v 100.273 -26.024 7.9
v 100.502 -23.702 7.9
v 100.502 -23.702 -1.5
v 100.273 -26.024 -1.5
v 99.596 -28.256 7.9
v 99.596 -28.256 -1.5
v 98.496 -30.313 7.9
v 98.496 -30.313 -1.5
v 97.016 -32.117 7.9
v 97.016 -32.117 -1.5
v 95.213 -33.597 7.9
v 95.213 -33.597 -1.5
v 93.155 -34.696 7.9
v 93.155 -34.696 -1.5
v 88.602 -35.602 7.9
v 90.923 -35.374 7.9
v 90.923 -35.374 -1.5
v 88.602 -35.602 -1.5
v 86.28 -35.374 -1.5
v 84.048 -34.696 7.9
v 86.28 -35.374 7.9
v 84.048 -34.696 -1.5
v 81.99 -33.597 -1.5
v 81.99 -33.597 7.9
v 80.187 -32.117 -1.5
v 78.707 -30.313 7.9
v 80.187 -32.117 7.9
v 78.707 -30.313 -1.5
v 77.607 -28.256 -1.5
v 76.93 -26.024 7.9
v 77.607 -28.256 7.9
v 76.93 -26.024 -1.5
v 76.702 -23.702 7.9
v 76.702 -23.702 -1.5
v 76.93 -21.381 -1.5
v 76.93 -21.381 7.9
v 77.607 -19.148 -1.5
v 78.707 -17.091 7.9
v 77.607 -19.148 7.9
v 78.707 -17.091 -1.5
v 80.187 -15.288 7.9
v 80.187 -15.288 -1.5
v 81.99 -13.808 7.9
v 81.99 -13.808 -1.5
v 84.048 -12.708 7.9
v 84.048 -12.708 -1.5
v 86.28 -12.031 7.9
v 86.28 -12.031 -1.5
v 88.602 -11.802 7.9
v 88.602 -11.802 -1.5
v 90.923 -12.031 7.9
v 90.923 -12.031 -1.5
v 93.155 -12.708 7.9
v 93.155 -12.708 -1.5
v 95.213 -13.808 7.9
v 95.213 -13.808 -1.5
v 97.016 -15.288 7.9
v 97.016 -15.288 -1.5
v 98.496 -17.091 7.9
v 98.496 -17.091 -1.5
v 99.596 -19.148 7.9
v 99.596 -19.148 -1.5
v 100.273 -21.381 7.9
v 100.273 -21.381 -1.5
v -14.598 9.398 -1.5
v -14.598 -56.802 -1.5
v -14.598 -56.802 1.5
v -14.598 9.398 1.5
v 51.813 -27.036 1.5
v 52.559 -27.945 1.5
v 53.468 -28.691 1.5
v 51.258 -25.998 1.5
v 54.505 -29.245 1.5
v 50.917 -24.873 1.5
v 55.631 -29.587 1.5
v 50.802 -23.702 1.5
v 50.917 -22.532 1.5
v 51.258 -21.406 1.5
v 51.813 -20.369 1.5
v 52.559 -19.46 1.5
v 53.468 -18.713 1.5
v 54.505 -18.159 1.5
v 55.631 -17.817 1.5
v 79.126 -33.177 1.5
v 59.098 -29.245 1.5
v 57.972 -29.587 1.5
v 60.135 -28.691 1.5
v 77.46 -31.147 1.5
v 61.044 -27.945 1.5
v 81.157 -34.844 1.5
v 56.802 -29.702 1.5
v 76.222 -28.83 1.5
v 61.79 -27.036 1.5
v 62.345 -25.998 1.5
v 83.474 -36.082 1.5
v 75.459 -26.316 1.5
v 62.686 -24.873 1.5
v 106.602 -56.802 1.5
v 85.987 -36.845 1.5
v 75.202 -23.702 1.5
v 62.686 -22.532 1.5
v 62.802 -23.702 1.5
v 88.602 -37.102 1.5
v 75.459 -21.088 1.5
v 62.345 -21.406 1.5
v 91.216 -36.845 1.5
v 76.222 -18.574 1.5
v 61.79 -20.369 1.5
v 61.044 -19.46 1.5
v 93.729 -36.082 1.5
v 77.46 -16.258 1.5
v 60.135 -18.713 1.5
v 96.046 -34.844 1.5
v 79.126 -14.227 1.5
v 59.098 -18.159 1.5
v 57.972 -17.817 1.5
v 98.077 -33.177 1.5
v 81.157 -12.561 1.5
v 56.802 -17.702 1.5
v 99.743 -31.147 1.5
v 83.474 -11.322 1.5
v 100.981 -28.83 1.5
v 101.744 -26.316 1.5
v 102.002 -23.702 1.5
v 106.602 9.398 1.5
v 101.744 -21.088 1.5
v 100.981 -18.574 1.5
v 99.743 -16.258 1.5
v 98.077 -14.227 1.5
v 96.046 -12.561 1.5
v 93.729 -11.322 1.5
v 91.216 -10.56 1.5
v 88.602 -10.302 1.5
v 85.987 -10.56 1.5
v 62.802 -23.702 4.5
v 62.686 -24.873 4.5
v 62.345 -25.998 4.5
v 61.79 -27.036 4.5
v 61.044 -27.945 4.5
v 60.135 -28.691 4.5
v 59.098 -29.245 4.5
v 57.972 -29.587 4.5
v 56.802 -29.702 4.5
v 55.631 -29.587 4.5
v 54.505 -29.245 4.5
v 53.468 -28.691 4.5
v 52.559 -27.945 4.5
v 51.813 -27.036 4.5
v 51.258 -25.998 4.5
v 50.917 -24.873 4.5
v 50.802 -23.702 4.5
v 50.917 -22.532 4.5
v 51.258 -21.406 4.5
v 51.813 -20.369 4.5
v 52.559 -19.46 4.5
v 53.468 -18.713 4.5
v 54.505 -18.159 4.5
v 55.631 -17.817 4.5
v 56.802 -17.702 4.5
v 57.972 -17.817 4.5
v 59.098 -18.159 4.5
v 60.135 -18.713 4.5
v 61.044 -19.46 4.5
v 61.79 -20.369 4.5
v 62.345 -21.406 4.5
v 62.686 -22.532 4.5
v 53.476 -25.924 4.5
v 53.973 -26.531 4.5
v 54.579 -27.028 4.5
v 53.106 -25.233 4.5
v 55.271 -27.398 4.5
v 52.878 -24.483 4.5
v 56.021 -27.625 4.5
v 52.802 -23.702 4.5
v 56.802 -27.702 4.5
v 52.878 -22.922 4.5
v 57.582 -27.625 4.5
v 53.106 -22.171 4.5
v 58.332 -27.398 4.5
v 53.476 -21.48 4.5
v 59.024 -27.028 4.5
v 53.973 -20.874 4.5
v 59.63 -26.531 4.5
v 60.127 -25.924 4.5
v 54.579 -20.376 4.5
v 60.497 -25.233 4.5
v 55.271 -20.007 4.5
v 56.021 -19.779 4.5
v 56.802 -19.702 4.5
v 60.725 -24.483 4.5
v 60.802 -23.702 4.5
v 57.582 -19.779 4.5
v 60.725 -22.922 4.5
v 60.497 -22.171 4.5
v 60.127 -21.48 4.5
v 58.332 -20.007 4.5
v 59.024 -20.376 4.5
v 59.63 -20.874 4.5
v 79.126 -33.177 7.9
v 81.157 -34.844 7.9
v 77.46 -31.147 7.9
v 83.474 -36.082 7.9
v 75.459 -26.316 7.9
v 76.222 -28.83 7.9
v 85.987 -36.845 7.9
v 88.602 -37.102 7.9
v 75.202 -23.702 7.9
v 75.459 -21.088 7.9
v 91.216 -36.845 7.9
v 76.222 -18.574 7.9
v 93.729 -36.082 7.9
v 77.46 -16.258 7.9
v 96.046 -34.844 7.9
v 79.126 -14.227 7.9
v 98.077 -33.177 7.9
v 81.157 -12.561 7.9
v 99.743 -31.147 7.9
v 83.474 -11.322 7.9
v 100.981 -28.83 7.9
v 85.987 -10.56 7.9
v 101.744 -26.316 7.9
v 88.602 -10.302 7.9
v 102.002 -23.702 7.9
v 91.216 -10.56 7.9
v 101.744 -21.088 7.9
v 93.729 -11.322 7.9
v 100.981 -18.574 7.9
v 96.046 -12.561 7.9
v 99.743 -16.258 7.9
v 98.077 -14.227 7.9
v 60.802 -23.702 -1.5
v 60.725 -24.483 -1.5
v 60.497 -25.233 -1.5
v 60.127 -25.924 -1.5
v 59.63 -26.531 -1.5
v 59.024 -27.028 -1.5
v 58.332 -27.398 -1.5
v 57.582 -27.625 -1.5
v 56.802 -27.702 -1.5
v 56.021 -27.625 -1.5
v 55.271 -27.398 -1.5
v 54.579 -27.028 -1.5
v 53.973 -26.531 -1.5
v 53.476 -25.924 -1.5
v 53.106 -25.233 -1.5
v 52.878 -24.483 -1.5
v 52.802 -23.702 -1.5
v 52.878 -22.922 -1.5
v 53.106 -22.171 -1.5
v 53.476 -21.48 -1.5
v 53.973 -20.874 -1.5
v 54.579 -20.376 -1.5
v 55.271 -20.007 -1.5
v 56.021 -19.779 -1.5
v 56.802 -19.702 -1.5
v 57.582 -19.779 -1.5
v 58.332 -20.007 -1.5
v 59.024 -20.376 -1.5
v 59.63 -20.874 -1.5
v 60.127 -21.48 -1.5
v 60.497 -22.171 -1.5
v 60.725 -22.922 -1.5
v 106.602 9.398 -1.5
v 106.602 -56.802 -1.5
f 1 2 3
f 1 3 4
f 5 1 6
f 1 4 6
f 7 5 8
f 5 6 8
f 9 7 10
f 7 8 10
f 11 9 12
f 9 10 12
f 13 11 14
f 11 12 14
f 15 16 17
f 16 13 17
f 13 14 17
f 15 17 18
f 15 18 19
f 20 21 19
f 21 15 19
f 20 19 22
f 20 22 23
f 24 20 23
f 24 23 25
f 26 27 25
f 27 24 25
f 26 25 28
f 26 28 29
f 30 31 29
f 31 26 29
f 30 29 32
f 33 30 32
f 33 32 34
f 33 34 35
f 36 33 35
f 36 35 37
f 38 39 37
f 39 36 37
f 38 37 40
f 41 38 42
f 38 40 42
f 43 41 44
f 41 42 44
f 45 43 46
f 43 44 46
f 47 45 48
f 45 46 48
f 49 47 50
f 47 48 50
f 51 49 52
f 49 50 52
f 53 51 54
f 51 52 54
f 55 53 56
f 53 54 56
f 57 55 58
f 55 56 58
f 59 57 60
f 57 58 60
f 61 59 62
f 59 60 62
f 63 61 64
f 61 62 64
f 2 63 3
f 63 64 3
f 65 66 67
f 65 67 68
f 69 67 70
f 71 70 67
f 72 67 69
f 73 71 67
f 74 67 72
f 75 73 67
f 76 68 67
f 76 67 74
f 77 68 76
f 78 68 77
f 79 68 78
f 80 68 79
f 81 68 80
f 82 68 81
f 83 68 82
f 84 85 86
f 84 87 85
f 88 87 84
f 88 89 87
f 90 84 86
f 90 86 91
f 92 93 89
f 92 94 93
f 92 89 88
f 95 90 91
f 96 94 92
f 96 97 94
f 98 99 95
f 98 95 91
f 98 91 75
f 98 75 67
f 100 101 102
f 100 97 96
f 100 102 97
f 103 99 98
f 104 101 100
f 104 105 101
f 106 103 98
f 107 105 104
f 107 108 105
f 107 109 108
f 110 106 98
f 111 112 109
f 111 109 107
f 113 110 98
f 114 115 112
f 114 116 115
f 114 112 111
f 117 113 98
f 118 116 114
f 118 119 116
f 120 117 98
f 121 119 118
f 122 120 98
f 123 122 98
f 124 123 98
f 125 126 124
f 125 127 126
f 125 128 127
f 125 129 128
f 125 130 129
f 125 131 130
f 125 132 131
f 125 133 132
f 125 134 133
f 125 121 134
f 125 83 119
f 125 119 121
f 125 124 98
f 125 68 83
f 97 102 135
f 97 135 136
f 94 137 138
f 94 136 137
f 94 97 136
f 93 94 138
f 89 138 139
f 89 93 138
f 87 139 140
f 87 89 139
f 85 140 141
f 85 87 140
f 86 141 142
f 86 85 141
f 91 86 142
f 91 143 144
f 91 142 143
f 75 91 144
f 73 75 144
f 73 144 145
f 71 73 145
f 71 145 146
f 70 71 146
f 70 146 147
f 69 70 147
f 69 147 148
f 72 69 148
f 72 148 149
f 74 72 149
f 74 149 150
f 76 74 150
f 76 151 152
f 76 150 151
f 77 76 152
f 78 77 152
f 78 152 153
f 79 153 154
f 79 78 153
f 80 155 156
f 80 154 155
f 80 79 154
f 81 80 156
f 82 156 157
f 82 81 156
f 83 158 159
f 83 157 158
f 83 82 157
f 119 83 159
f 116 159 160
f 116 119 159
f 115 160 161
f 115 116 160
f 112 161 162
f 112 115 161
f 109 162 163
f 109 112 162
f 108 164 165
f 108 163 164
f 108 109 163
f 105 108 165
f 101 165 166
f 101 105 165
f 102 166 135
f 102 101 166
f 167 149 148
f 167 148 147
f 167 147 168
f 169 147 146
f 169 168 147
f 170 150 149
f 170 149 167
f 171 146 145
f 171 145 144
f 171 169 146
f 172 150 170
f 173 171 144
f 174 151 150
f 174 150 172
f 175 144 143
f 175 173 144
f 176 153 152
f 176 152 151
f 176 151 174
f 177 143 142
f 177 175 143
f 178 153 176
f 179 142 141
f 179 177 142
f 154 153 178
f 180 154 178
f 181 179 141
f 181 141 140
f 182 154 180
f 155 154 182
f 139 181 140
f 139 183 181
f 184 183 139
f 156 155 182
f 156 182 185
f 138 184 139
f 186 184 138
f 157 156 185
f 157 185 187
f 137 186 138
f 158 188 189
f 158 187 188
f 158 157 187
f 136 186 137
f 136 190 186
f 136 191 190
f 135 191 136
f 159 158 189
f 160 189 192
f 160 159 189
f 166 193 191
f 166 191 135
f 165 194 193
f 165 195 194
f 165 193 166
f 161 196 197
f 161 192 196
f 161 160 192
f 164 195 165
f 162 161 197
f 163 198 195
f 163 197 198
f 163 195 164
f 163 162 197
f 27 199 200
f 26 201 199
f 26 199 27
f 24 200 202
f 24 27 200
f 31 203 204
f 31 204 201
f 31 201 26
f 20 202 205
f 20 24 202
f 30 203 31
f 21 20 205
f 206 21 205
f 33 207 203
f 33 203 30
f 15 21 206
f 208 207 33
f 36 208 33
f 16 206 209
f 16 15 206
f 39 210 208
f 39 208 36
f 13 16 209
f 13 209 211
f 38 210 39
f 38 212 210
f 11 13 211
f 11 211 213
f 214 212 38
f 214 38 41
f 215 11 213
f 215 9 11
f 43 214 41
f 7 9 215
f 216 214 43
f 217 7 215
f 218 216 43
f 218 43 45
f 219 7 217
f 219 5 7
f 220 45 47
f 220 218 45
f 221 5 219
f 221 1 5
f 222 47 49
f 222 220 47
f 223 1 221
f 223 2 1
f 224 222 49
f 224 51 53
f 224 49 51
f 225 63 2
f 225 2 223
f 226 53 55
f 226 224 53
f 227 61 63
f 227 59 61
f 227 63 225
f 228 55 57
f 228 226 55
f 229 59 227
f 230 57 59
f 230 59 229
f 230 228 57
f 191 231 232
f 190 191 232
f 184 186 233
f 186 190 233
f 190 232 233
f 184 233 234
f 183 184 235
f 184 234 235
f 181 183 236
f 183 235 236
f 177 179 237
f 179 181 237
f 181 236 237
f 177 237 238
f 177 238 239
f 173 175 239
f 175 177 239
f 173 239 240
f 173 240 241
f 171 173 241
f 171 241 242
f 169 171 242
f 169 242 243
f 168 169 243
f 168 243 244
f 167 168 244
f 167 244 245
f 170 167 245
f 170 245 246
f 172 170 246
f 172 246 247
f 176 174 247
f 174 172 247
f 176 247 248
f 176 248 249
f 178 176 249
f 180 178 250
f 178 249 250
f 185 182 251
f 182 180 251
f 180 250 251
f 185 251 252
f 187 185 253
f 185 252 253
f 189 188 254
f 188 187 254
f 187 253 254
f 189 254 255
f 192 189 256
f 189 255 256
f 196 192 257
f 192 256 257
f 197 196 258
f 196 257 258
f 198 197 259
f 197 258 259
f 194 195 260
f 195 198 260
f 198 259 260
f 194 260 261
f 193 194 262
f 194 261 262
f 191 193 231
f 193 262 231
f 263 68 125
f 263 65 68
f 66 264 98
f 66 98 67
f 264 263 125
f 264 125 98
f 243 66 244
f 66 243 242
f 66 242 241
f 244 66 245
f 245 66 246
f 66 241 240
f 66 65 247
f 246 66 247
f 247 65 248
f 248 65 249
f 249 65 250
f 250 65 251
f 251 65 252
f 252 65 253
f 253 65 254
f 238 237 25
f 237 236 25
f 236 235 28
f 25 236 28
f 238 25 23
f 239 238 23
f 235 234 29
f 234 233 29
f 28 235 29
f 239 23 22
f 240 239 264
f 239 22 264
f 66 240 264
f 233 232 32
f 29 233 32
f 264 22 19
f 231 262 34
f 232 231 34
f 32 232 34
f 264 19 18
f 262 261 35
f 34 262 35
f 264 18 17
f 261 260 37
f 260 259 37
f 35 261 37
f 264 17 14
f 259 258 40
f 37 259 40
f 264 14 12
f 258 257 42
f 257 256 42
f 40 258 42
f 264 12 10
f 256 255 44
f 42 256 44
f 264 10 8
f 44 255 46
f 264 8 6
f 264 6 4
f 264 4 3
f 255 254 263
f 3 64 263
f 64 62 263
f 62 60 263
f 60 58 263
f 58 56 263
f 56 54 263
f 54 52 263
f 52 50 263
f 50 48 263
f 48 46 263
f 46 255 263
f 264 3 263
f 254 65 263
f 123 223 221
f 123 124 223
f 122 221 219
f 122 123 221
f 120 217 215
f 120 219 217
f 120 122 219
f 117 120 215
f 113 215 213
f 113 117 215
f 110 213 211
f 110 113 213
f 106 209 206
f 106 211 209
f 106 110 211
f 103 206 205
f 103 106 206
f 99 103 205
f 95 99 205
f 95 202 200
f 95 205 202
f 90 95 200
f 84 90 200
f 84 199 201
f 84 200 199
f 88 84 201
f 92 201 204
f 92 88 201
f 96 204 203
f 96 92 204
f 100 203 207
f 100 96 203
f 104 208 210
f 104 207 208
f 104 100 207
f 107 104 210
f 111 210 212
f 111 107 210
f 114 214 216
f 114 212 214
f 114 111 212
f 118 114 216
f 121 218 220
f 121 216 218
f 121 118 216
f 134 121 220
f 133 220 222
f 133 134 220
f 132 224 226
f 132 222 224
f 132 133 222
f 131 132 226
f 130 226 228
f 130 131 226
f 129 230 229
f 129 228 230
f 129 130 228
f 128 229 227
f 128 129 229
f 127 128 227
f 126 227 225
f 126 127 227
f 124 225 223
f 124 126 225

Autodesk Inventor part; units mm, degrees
ref_plane "YZ Plane" through (0, 0, 0) normal (1, 0, 0) x (0, 1, 0)
ref_plane "XZ Plane" through (0, 0, 0) normal (0, 1, 0) x (-1, 0, 0)
ref_plane "XY Plane" through (0, 0, 0) normal (0, 0, 1) x (1, 0, 0)
sketch "Sketch1" plane through (0, 0, 0) normal (0, 0, 1) x (1, 0, 0)
  line L0 (-14.5985, 9.3978) -> (106.6015, 9.3978)
  line L1 (106.6015, 9.3978) -> (106.6015, -56.8022)
  line L2 (106.6015, -56.8022) -> (-14.5985, -56.8022)
  line L3 (-14.5985, -56.8022) -> (-14.5985, 9.3978)
  circle A0 centre (88.6015, -23.7022) radius 11.9
  circle A1 centre (56.8015, -23.7022) radius 4
  point P0 (0, 0)
  dimension "d0" = 121.2
  dimension "d1" = 66.2
  dimension "d3" = 33.1
  dimension "d4" = 8
  dimension "d5" = 23.8
  dimension "d6" = 18
  dimension "d17" = 31.8
extrude "Extrusion1" add sketch "Sketch1" along normal mid plane 3
sketch "Sketch2" plane through (0, 0, 1.5) normal (0, 0, 1) x (1, 0, 0)
  circle A0 centre (56.8015, -23.7022) radius 4 projected
  circle A1 centre (56.8015, -23.7022) radius 6
  point P0 (0, 0)
  dimension "d10" = 12
extrude "Extrusion2" add sketch "Sketch2" along normal blind 3
sketch "Sketch3" plane through (0, 0, 1.5) normal (0, 0, 1) x (1, 0, 0)
  circle A0 centre (88.6015, -23.7022) radius 11.9 projected
  circle A1 centre (88.6015, -23.7022) radius 13.4
  point P0 (0, 0)
  dimension "d13" = 23.8
  dimension "d14" = 26.8
extrude "Extrusion3" add sketch "Sketch3" along normal blind 6.4
equation "\"d3\" = 0.5 * d1"
properties part number "Cover"
